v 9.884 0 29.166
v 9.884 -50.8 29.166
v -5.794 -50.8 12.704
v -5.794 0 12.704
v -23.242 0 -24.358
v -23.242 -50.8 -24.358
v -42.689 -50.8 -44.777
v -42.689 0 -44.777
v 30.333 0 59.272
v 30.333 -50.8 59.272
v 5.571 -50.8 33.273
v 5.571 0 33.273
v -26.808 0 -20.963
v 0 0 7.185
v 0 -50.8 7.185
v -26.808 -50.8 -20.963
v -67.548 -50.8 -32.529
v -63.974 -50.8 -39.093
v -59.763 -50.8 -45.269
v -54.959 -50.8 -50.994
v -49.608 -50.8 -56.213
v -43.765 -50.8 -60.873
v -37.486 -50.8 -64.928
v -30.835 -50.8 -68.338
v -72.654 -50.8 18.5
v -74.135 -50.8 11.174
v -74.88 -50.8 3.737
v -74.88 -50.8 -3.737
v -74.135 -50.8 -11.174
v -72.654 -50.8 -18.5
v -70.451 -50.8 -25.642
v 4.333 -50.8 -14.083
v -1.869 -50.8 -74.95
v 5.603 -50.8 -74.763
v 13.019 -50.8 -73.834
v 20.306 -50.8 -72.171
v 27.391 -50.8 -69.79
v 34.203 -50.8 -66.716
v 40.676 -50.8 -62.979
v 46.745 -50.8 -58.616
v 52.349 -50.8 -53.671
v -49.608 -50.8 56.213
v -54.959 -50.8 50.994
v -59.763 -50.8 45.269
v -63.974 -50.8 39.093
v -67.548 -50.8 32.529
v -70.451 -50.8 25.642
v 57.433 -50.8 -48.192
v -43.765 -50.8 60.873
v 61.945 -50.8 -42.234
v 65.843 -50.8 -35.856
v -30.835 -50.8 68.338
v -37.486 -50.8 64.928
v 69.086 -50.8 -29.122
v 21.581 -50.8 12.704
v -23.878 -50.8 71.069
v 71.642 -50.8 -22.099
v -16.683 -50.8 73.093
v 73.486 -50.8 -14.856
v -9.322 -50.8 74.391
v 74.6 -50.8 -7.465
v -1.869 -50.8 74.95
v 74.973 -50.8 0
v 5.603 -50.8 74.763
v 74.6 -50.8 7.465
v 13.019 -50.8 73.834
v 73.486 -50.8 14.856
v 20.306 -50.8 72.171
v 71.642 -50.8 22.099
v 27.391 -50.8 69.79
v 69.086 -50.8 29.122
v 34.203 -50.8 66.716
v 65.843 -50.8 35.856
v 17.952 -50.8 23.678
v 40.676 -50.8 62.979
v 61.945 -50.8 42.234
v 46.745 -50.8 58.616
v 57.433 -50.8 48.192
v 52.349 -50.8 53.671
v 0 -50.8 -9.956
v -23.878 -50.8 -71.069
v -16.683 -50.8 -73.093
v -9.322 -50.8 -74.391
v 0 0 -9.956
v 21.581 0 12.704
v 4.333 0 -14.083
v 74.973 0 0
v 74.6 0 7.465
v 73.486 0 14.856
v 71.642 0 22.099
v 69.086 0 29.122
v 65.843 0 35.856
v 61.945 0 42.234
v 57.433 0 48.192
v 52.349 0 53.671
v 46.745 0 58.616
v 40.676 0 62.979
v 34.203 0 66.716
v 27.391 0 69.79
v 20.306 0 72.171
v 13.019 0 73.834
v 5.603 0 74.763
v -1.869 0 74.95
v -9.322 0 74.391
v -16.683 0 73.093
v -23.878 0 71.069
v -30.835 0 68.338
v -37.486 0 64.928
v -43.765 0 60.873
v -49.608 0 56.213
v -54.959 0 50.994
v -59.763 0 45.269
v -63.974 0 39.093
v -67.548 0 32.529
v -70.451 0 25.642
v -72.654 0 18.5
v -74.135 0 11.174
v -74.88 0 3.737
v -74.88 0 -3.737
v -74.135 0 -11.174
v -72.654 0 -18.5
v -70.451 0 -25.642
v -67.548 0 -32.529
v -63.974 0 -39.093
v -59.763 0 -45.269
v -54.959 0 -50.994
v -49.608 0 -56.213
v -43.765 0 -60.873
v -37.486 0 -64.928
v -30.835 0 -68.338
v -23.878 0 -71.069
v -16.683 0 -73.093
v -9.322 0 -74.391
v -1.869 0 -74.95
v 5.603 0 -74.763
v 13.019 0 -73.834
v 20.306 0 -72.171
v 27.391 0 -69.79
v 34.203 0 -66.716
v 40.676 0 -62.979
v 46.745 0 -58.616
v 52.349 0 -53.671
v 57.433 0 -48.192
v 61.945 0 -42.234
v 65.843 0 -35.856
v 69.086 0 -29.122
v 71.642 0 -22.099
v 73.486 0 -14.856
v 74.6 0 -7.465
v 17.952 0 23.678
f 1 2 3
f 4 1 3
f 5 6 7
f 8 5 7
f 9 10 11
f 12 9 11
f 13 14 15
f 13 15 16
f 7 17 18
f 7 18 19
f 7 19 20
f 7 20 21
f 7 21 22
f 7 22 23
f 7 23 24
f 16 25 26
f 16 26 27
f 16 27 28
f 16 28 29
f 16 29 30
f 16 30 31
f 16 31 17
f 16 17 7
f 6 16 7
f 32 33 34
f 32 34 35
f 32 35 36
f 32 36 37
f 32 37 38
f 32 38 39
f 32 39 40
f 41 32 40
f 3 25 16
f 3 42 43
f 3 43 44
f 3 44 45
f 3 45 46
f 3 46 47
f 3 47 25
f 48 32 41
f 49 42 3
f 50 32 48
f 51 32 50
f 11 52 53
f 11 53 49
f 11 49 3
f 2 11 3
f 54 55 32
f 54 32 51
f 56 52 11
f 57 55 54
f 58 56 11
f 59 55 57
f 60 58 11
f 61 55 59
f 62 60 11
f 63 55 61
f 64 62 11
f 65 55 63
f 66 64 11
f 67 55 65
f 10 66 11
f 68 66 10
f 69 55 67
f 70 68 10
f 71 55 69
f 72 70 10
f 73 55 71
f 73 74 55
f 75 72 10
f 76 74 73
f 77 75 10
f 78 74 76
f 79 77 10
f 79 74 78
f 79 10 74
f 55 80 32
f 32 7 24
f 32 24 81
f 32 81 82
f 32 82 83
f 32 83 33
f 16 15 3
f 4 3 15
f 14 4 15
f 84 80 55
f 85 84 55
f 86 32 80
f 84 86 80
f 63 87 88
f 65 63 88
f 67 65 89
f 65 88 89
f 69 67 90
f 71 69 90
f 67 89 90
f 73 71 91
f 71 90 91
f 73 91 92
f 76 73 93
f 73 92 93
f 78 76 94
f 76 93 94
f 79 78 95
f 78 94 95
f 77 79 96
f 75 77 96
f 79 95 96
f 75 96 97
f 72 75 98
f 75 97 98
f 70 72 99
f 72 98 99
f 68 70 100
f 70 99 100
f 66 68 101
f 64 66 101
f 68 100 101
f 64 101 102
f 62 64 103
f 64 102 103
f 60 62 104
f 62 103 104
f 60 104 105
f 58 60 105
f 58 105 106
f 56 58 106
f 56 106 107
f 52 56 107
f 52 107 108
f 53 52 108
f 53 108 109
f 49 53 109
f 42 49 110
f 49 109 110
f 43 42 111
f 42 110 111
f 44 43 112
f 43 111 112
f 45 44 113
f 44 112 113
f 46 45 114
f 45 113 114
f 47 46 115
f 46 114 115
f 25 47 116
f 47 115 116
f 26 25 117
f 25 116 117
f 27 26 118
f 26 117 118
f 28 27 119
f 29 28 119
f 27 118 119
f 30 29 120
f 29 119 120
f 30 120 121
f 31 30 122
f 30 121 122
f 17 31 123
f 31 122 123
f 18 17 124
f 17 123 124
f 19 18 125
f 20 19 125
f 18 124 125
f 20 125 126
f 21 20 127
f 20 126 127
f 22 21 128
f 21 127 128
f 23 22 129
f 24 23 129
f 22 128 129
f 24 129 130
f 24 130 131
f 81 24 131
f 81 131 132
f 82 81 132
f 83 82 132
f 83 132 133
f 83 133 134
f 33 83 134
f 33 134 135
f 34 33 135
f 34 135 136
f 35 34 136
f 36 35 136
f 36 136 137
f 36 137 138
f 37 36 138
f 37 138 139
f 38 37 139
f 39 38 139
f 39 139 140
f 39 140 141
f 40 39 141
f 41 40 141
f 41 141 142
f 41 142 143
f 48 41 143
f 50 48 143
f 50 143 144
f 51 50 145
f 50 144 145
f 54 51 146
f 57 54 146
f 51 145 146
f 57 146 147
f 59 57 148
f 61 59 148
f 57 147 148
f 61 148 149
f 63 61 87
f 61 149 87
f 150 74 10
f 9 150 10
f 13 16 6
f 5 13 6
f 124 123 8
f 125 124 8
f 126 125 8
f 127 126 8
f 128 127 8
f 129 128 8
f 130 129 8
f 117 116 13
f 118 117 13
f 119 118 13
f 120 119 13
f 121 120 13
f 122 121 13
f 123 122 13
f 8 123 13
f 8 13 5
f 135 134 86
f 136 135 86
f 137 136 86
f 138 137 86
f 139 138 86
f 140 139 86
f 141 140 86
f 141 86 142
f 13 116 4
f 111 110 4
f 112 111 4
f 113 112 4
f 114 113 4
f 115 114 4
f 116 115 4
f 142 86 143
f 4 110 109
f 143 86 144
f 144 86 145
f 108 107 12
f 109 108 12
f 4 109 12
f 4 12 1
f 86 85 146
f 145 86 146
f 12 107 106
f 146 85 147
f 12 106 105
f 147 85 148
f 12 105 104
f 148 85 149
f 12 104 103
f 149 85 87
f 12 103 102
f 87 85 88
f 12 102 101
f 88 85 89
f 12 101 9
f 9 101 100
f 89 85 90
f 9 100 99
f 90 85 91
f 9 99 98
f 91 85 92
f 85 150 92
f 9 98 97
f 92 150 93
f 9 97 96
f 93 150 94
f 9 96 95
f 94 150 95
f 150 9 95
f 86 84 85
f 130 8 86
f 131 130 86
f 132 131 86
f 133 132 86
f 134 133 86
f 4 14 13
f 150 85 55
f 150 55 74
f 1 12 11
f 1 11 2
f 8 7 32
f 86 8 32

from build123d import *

# Parameters (mm, degrees)
F0_R     = 74.972812
F1_DEPTH = 50.8
F3_DEPTH = 76.2


with BuildPart() as f1:
    # F0 (on Front) → F1 (new body)
    with BuildSketch(Plane.XZ):
        Circle(F0_R)
    extrude(amount=F1_DEPTH)

    # F2 (on face) → F3 (cut)
    with BuildSketch(Plane.XZ.offset(50.8)):
        Polygon((17.951952, 23.678008), (30.332614, 59.272397), (5.571298, 33.273019), (9.883918, 29.165761), (-5.794326, 12.703607), (0, 7.185201), (-26.807584, -20.962759), (-23.24244, -24.358134), (-42.689349, -44.777386), (4.333233, -14.082998), (0, -9.956109), (21.580685, 12.703607), align=None)
    extrude(amount=-F3_DEPTH, mode=Mode.SUBTRACT)


solid = f1.part
